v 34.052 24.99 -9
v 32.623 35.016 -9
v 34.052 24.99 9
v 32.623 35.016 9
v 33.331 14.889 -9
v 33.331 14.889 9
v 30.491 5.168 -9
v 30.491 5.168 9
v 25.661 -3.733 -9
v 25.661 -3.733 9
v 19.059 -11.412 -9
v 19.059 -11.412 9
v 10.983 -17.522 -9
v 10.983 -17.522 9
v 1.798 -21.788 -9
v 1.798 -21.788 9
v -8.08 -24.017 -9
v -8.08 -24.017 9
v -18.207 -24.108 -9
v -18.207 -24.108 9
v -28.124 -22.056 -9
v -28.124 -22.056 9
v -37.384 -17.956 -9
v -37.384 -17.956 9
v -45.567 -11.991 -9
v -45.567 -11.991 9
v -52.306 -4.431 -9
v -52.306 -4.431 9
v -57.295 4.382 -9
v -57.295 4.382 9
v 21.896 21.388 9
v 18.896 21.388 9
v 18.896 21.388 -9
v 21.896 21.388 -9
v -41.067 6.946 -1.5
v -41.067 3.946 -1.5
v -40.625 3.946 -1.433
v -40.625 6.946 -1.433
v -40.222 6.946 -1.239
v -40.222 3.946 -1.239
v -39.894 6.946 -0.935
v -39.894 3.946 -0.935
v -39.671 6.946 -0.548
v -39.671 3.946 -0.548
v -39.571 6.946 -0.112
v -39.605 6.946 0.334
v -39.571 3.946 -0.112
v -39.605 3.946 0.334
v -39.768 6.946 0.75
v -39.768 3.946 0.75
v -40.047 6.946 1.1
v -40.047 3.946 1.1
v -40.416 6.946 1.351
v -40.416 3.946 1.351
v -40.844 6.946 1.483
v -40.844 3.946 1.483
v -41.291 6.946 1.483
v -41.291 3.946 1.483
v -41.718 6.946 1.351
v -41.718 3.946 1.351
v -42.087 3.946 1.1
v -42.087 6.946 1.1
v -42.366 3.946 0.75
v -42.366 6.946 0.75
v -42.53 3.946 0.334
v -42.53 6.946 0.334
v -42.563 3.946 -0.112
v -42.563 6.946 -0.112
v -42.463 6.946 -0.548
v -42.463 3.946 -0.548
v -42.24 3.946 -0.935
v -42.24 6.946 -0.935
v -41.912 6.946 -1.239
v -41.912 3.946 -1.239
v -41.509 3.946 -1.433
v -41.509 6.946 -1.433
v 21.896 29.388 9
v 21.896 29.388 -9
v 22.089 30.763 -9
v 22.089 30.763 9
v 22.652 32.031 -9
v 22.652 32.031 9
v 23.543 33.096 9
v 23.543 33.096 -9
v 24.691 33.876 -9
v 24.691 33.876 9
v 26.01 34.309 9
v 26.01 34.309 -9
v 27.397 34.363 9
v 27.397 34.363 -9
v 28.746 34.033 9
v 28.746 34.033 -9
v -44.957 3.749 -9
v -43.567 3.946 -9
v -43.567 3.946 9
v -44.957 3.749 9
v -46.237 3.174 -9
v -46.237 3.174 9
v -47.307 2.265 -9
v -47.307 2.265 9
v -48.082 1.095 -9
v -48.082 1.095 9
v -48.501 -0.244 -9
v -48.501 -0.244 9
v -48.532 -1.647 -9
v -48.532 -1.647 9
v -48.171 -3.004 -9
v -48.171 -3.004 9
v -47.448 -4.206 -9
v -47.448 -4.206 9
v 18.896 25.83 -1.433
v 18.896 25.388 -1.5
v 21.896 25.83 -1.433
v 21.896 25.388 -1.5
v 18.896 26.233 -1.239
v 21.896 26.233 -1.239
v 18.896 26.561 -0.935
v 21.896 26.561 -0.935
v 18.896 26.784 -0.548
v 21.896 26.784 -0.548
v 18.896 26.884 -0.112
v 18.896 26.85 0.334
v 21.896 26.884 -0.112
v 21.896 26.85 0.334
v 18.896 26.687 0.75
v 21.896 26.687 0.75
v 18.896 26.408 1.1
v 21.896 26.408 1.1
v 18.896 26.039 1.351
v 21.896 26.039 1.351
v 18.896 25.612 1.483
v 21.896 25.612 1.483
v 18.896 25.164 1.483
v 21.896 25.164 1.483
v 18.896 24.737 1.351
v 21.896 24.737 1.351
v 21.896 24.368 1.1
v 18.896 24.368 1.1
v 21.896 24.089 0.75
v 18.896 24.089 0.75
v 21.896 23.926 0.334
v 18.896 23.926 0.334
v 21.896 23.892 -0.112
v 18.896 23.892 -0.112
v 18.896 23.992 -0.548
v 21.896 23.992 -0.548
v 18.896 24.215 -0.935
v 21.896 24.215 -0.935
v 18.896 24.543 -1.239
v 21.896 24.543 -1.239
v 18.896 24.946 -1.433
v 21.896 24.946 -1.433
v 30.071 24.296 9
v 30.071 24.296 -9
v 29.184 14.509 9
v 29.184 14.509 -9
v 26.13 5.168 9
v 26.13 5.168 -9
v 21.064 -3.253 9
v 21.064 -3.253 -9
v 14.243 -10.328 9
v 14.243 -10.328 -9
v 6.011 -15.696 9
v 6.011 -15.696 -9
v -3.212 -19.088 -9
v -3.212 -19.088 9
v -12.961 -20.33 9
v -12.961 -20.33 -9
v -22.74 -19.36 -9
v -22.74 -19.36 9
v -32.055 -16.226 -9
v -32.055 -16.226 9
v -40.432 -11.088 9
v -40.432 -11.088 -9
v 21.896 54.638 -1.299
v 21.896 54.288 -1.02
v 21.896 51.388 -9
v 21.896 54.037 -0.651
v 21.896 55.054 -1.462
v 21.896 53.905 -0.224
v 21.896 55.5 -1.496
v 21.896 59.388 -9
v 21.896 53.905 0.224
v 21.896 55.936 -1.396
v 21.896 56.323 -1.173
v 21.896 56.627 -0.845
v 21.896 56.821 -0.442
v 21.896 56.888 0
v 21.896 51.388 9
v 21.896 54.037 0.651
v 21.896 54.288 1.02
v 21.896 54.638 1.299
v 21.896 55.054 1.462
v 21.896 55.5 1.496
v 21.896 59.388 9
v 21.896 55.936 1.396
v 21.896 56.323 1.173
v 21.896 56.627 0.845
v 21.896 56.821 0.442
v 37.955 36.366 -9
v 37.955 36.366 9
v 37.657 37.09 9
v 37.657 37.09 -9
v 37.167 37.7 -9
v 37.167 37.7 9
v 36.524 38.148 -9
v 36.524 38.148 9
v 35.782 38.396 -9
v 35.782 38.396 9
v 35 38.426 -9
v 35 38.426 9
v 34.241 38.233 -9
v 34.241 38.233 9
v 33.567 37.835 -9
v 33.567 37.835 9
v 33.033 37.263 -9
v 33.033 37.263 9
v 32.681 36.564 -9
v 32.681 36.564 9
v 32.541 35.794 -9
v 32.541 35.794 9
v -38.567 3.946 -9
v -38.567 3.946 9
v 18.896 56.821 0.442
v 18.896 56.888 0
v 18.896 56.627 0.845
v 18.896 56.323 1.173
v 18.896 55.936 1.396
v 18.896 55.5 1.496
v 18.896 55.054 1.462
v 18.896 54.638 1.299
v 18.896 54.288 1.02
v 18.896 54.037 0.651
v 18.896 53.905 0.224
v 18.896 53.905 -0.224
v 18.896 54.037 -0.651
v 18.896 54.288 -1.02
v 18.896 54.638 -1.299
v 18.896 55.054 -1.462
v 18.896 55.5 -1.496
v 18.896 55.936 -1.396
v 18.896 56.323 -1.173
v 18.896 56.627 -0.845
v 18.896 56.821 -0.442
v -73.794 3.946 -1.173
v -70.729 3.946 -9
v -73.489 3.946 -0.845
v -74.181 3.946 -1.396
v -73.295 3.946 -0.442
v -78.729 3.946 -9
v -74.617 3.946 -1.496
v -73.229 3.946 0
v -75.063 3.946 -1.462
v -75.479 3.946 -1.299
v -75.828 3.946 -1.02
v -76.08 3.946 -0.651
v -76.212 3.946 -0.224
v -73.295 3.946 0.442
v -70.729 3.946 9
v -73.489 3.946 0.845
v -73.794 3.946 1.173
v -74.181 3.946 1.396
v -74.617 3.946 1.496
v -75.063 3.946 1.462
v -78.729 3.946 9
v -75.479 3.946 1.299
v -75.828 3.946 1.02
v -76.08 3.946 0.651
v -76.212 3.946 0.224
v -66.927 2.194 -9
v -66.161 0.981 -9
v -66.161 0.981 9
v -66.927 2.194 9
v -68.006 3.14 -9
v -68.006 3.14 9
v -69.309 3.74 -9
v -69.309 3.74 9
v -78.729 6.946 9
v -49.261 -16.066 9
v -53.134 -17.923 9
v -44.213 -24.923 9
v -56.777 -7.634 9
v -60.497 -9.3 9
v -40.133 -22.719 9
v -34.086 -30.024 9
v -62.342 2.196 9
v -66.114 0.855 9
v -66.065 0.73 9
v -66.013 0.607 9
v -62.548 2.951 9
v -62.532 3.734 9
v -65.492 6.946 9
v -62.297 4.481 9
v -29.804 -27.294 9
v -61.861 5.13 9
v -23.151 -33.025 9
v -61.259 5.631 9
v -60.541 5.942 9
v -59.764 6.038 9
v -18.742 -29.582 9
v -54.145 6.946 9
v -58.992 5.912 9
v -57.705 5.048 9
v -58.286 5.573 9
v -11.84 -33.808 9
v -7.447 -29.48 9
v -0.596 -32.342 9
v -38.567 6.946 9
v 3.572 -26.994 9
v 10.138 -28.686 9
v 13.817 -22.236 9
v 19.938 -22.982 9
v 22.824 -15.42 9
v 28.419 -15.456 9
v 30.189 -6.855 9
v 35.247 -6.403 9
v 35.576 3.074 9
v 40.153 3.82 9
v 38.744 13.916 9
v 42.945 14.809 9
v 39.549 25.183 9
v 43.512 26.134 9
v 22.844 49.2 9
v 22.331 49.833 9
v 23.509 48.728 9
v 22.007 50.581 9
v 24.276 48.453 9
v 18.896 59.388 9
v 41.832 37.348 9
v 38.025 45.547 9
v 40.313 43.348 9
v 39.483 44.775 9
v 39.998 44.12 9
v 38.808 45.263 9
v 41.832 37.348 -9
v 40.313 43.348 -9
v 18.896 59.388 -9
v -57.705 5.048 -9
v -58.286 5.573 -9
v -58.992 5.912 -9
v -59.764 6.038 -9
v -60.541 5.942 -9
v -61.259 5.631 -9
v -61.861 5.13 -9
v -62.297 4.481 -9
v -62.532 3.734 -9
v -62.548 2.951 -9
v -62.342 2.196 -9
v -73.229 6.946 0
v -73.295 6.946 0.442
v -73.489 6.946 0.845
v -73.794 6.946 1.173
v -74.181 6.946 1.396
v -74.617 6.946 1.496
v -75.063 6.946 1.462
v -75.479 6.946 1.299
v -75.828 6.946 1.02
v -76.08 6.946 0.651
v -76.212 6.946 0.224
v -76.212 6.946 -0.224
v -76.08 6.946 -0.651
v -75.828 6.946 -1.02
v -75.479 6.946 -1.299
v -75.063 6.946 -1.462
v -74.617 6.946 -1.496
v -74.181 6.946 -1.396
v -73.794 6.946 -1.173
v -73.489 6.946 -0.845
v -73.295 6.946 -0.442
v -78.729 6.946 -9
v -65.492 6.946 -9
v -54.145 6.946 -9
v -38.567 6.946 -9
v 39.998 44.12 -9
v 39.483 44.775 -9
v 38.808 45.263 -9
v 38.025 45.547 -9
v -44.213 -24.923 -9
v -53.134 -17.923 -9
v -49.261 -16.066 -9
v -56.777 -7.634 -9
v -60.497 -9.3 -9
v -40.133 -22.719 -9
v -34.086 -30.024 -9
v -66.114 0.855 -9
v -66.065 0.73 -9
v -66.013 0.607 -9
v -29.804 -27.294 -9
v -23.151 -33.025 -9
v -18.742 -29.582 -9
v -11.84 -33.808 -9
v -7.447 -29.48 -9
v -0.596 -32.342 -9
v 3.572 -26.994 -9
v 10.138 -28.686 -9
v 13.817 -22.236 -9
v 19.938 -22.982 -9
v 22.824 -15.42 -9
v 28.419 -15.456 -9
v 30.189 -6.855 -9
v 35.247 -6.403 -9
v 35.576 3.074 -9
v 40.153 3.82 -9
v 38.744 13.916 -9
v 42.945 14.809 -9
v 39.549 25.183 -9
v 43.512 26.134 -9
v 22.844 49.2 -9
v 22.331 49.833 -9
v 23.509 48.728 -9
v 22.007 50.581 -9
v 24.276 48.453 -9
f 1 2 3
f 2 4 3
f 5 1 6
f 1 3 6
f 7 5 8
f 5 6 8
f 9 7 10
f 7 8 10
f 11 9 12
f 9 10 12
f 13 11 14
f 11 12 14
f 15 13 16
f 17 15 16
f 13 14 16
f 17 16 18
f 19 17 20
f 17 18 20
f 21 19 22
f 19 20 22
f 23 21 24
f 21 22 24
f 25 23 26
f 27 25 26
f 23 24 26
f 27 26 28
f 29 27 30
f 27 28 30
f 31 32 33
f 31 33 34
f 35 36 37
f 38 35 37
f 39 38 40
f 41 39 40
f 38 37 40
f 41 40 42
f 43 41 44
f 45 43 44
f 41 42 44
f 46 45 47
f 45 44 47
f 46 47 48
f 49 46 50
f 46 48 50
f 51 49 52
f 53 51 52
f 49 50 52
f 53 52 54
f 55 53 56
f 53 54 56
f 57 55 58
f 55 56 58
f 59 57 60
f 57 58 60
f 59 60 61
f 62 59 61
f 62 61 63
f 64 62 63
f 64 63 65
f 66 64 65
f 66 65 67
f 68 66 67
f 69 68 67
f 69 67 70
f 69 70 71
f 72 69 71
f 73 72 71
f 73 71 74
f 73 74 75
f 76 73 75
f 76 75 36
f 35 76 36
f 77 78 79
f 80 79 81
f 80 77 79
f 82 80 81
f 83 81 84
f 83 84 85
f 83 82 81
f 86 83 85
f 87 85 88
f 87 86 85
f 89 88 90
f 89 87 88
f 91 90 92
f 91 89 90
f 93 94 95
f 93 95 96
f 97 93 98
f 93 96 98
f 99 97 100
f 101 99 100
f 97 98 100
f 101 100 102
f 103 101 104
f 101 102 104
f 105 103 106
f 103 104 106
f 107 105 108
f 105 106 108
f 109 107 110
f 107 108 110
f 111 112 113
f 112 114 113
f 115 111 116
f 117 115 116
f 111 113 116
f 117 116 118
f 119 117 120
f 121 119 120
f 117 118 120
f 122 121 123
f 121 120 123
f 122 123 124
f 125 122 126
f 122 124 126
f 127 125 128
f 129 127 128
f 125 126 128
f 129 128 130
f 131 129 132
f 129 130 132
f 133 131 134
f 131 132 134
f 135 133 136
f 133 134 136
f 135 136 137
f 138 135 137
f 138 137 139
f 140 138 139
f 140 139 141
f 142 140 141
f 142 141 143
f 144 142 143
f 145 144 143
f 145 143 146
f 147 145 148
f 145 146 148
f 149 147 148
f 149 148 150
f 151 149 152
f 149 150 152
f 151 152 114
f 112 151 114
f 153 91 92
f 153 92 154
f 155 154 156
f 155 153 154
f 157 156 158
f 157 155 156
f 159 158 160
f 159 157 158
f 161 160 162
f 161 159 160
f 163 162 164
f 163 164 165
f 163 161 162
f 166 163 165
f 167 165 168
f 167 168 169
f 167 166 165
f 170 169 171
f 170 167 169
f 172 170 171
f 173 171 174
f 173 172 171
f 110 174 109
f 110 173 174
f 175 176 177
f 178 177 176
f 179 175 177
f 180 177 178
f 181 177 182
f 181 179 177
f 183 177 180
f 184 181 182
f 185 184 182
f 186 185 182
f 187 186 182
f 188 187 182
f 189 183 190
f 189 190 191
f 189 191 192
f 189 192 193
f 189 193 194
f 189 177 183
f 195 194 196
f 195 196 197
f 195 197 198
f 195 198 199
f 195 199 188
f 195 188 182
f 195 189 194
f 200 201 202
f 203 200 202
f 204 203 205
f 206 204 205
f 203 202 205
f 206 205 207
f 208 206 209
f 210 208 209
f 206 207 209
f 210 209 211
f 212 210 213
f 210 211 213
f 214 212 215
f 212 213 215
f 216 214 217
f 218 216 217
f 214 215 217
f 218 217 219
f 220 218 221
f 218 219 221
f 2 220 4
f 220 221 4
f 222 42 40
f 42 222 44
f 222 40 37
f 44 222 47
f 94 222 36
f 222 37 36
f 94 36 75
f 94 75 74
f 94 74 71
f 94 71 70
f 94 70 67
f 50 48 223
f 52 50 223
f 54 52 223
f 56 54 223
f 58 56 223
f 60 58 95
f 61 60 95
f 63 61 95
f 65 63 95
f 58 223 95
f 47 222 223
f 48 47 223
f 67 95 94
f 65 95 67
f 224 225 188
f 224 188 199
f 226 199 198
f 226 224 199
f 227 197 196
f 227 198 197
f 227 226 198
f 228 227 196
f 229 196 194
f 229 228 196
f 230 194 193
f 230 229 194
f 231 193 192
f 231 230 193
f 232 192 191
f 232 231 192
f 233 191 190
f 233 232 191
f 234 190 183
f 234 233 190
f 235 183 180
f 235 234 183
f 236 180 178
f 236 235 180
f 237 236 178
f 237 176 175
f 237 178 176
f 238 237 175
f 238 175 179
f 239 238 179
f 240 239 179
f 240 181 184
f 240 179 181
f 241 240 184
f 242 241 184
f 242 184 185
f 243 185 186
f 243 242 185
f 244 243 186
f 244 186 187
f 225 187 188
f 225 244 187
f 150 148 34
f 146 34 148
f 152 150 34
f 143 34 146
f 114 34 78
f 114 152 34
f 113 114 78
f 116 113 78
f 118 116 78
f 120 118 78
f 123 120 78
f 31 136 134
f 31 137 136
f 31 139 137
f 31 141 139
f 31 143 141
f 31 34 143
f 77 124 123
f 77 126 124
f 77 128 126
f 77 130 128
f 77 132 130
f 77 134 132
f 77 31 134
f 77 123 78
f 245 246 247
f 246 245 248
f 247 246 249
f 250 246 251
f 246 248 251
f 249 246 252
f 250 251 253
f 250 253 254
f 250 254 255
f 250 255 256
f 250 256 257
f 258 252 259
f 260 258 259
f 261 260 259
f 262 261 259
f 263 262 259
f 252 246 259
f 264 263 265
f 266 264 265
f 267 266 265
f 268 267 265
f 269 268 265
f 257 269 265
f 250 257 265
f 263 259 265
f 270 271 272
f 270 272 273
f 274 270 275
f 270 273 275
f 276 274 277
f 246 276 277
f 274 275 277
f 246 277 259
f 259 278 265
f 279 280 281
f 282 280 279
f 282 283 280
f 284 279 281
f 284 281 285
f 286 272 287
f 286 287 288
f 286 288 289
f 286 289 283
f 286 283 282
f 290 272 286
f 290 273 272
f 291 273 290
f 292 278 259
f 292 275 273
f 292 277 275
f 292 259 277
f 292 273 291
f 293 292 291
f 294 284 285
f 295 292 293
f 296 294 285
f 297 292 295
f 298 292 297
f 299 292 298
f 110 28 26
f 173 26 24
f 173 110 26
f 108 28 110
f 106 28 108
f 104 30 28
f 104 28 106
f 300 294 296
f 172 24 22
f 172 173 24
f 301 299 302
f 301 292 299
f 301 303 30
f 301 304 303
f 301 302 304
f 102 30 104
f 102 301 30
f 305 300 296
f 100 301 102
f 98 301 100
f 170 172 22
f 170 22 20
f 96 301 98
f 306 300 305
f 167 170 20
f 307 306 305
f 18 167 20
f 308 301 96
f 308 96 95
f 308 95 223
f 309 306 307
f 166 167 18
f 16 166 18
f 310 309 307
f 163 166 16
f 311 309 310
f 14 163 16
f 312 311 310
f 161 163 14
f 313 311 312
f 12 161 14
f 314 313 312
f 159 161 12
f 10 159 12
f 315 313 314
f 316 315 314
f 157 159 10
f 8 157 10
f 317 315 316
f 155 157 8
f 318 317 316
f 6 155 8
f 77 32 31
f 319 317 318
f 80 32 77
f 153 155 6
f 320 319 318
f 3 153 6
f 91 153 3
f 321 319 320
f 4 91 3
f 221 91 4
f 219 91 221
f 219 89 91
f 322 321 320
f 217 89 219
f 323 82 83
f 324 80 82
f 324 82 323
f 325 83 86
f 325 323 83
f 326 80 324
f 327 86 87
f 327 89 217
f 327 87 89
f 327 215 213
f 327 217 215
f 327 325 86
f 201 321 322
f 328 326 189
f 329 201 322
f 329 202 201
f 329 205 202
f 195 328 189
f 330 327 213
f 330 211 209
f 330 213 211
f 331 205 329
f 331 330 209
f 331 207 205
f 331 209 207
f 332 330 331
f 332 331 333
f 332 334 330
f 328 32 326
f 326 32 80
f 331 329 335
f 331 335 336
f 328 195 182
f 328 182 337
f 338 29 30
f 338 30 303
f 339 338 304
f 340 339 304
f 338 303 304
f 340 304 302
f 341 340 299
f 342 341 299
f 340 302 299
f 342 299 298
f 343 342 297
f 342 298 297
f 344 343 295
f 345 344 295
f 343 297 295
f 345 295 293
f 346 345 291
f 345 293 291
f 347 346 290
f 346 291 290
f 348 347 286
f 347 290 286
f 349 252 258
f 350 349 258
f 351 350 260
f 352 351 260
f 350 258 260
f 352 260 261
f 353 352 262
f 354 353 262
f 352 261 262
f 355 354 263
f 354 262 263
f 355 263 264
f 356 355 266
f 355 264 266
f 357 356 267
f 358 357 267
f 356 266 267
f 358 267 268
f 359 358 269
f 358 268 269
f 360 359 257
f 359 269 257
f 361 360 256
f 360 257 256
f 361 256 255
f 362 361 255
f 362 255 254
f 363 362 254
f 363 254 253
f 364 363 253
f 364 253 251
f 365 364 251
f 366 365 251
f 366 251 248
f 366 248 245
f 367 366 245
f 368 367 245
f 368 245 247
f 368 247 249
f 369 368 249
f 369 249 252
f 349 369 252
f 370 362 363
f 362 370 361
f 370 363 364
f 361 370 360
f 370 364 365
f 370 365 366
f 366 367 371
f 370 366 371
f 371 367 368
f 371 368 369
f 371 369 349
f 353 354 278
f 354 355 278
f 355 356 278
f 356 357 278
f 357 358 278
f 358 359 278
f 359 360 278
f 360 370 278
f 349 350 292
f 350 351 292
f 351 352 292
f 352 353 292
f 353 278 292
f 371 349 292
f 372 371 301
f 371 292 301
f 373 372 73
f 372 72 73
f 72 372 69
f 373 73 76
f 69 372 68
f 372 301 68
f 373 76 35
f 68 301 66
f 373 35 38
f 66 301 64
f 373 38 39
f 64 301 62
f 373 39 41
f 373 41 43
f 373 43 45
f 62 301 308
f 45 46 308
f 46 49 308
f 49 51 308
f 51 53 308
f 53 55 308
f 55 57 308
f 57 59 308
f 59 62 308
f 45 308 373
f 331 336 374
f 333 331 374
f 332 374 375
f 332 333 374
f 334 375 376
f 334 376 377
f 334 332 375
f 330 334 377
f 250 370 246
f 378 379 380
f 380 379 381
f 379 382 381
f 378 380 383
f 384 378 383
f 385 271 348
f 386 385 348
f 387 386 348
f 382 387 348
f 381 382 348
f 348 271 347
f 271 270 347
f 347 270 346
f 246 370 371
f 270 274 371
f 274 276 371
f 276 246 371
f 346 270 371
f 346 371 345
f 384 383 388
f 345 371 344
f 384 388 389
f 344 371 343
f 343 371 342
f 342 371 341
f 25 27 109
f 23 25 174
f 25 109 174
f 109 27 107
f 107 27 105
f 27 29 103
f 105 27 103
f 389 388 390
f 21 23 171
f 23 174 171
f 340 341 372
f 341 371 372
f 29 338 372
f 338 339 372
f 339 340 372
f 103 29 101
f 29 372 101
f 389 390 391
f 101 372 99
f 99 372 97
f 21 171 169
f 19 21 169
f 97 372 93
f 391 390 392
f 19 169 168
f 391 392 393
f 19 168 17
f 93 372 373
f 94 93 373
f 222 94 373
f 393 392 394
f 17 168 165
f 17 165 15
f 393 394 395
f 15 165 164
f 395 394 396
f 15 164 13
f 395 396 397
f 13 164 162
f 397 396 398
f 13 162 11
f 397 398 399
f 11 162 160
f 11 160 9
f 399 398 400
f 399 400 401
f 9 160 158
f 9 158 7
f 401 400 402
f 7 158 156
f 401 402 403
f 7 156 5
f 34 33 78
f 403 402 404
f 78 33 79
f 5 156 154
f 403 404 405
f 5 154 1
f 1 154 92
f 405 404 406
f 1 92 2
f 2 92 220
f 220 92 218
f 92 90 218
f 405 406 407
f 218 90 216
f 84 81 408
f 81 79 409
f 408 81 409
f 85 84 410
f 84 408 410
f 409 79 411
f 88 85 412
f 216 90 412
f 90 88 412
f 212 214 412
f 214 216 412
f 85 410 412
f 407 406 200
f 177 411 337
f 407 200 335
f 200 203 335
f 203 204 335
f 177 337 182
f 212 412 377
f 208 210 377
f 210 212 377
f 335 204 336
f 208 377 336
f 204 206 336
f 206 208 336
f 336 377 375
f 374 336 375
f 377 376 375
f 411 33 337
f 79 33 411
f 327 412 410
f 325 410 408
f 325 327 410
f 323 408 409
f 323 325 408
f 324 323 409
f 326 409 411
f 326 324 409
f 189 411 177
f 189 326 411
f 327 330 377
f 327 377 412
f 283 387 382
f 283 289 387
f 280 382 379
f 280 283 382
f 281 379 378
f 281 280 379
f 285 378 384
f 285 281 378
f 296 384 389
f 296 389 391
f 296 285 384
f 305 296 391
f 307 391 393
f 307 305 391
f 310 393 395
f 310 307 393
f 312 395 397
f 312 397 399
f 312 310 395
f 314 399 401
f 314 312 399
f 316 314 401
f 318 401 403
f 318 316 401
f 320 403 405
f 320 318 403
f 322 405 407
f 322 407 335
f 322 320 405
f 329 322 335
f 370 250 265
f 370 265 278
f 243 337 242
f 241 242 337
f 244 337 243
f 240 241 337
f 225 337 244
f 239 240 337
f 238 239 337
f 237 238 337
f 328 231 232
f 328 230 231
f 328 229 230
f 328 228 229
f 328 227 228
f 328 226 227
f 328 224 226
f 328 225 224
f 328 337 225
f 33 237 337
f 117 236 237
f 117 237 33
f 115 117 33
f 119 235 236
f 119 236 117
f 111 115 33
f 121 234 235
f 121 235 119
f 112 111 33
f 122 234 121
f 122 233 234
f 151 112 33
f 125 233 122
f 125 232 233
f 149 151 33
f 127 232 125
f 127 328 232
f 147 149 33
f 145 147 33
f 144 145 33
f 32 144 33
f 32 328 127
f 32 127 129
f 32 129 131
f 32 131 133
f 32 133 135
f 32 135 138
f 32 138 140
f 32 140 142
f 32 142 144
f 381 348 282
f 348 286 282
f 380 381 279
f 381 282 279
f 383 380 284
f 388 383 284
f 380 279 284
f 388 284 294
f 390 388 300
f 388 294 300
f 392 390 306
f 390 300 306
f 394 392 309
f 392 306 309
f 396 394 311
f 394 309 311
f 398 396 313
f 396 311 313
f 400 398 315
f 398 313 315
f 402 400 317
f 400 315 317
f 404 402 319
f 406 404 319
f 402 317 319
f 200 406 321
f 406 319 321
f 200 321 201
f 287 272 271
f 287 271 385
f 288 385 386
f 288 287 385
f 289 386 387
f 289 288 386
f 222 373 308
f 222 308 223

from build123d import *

# Parameters (mm, degrees)
SALIENTE_EXTRUIR2_DEPTH     = 9
SALIENTE_EXTRUIR4_START     = -18
SALIENTE_EXTRUIR4_DEPTH     = 18
CORTAR_EXTRUIR3_DEPTH       = 81.972689334
CORTAR_EXTRUIR3_DEPTH_BACK  = 81.972689334
CROQUIS8_W                  = 8.024298647
CROQUIS8_H                  = 2.298422897
SALIENTE_EXTRUIR5_START     = -18
SALIENTE_EXTRUIR5_DEPTH     = 18
SALIENTE_EXTRUIR6_DEPTH     = 18
SALIENTE_EXTRUIR7_START     = -18
SALIENTE_EXTRUIR7_DEPTH     = 18
CORTAR_EXTRUIR5_DEPTH       = 118.18938142
CORTAR_EXTRUIR5_DEPTH_BACK  = 118.18938142
CROQUIS13_R                 = 1.5
CROQUIS14_R                 = 1.5
CORTAR_EXTRUIR7_DEPTH       = 4
CROQUIS15_R                 = 1.5
CORTAR_EXTRUIR8_DEPTH       = 97.711059211
CROQUIS16_R                 = 1.5
CORTAR_EXTRUIR9_DEPTH       = 97.711059211
CORTAR_EXTRUIR10_DEPTH      = 101.245514063
CORTAR_EXTRUIR10_DEPTH_BACK = 101.245514063
CROQUIS17_W                 = 15.073627069
CROQUIS17_H                 = 8.059357869


with BuildPart() as part:
    # Croquis1 → Saliente-Extruir2 (new, symmetric)
    with BuildSketch(Plane.XY):
        with BuildLine():
            ThreePointArc((-66.012618404, 0.60672559), (4.861867519, -30.780766865), (41.832299444, 37.348188804))
            ThreePointArc((41.832299444, 37.348188804), (33.631578066, 42.234206494), (28.745560376, 34.033485116))
            ThreePointArc((28.745560376, 34.033485116), (0.508301336, -18.002016476), (-53.624180056, 5.97110769))
            ThreePointArc((-53.624180056, 5.97110769), (-62.50059028, 9.483135814), (-66.012618404, 0.60672559))
        make_face()
        with BuildLine():
            ThreePointArc((37.954747128, 36.366054378), (34.613712492, 38.356654178), (32.623112692, 35.015619542))
            ThreePointArc((32.623112692, 35.015619542), (1.798246872, -21.788312888), (-57.294828456, 4.381661142))
            ThreePointArc((-57.294828456, 4.381661142), (-60.911143732, 5.812487414), (-62.341970004, 2.196172138))
            ThreePointArc((-62.341970004, 2.196172138), (3.571921983, -26.994470453), (37.954747128, 36.366054378))
        make_face(mode=Mode.SUBTRACT)
    extrude(amount=SALIENTE_EXTRUIR2_DEPTH, both=True)

    # Croquis7 → Saliente-Extruir4 (add)
    with BuildSketch(Plane(origin=(0, 0, -9), x_dir=(-1, 0, 0), z_dir=(0, 0, -1)).offset(SALIENTE_EXTRUIR4_START)):
        with BuildLine():
            Line((54.145016493, 6.946132565), (38.567143253, 6.946132565))
            Line((38.567143253, 6.946132565), (38.567143253, 3.946132565))
            Line((38.567143253, 3.946132565), (43.567143253, 3.946132565))
            ThreePointArc((43.567143253, 3.946132565), (48.081738335, 1.095186137), (47.447985926, -4.206494934))
            ThreePointArc((47.447985926, -4.206494934), (50.884688207, 0.670758181), (53.624180056, 5.97110769))
            ThreePointArc((53.624180056, 5.97110769), (53.864605301, 6.469299926), (54.145016493, 6.946132565))
        make_face()
    extrude(amount=SALIENTE_EXTRUIR4_DEPTH)

    # Croquis8 → Cortar-Extruir3 (cut, two sides: drawn at the far end of the back side and taken through both)
    with BuildSketch(Plane(origin=(0, 0, -9), x_dir=(-1, 0, 0), z_dir=(0, 0, -1)).offset(-CORTAR_EXTRUIR3_DEPTH_BACK)):
        with Locations((58.157165816, 8.095344014)):
            Rectangle(CROQUIS8_W, CROQUIS8_H)
    extrude(amount=CORTAR_EXTRUIR3_DEPTH + CORTAR_EXTRUIR3_DEPTH_BACK, mode=Mode.SUBTRACT)

    # Croquis9 → Saliente-Extruir5 (add)
    with BuildSketch(Plane(origin=(0, 0, -9), x_dir=(-1, 0, 0), z_dir=(0, 0, -1)).offset(SALIENTE_EXTRUIR5_START)):
        with BuildLine():
            Line((78.728806569, 3.946132565), (78.728806569, 6.946132565))
            Line((78.728806569, 6.946132565), (65.491781967, 6.946132565))
            ThreePointArc((65.491781967, 6.946132565), (66.526259445, 4.041984592), (66.161494713, 0.980748601))
            ThreePointArc((66.161494713, 0.980748601), (68.00603961, 3.139763461), (70.728806569, 3.946132565))
            Line((70.728806569, 3.946132565), (78.728806569, 3.946132565))
        make_face()
    extrude(amount=SALIENTE_EXTRUIR5_DEPTH)

    # Croquis10 → Saliente-Extruir6 (add)
    with BuildSketch(Plane.XY.offset(9)):
        with BuildLine():
            Line((18.89630467, 56.388029989), (18.89630467, 21.388029989))
            Line((18.89630467, 21.388029989), (21.89630467, 21.388029989))
            Line((21.89630467, 21.388029989), (21.89630467, 29.388029989))
            ThreePointArc((21.89630467, 29.388029989), (24.089730114, 33.5260415), (28.745560376, 34.033485116))
            ThreePointArc((28.745560376, 34.033485116), (30.517183559, 40.465031841), (36.949638278, 42.233355414))
            Line((36.949638278, 42.233355414), (24.158212062, 45.48024401))
            ThreePointArc((24.158212062, 45.48024401), (22.528364866, 46.546057924), (21.89630467, 48.388029989))
            Line((21.89630467, 48.388029989), (21.89630467, 56.388029989))
            Line((21.89630467, 56.388029989), (18.89630467, 56.388029989))
        make_face()
    extrude(amount=-SALIENTE_EXTRUIR6_DEPTH)

    # Croquis12 → Saliente-Extruir7 (add)
    with BuildSketch(Plane(origin=(0, 0, -9), x_dir=(-1, 0, 0), z_dir=(0, 0, -1)).offset(SALIENTE_EXTRUIR7_START)):
        with BuildLine():
            Line((-41.832299444, 37.348188804), (-40.312576156, 43.348188804))
            ThreePointArc((-40.312576156, 43.348188804), (-39.483140086, 44.774662002), (-38.02482177, 45.546735616))
            Line((-38.02482177, 45.546735616), (-24.275894818, 48.452882358))
            ThreePointArc((-24.275894818, 48.452882358), (-22.565936721, 49.49874832), (-21.89630467, 51.388029989))
            Line((-21.89630467, 51.388029989), (-21.89630467, 59.388029989))
            Line((-21.89630467, 59.388029989), (-18.89630467, 59.388029989))
            Line((-18.89630467, 59.388029989), (-18.89630467, 21.388029989))
            Line((-18.89630467, 21.388029989), (-21.89630467, 21.388029989))
            Line((-21.89630467, 21.388029989), (-21.89630467, 29.388029989))
            ThreePointArc((-21.89630467, 29.388029989), (-24.089730114, 33.5260415), (-28.745560376, 34.033485116))
            Line((-28.745560376, 34.033485116), (-32.623112692, 35.015619542))
            ThreePointArc((-32.623112692, 35.015619542), (-34.613712492, 38.356654178), (-37.954747128, 36.366054378))
            Line((-37.954747128, 36.366054378), (-41.832299444, 37.348188804))
        make_face()
    extrude(amount=SALIENTE_EXTRUIR7_DEPTH)

    # Croquis13 → Cortar-Extruir5 (cut, two sides: drawn at the far end of the back side and taken through both)
    with BuildSketch(Plane(origin=(21.89630467, 0, 0), x_dir=(0, 0, -1), z_dir=(1, 0, 0)).offset(-CORTAR_EXTRUIR5_DEPTH_BACK)):
        with Locations(Location((0, 55.388029989, 0), (0, 0, 90))):
            Circle(CROQUIS13_R)
    extrude(amount=CORTAR_EXTRUIR5_DEPTH + CORTAR_EXTRUIR5_DEPTH_BACK, mode=Mode.SUBTRACT)

    # Croquis14 → Cortar-Extruir7 (cut, symmetric)
    with BuildSketch(Plane(origin=(21.89630467, 0, 0), x_dir=(0, 0, -1), z_dir=(1, 0, 0))):
        with Locations((0, 25.388029989)):
            Circle(CROQUIS14_R)
    extrude(amount=CORTAR_EXTRUIR7_DEPTH, both=True, mode=Mode.SUBTRACT)

    # Croquis15 → Cortar-Extruir8 (cut, through all)
    with BuildSketch(Plane.XZ.offset(-3.946132565)):
        with Locations((-74.728806569, 0)):
            Circle(CROQUIS15_R)
    extrude(amount=-CORTAR_EXTRUIR8_DEPTH, mode=Mode.SUBTRACT)

    # Croquis16 → Cortar-Extruir9 (cut, through all)
    with BuildSketch(Plane.XZ.offset(-3.946132565)):
        with Locations(Location((-41.067143253, 0, 0), (0, 0, 270))):
            Circle(CROQUIS16_R)
    extrude(amount=-CORTAR_EXTRUIR9_DEPTH, mode=Mode.SUBTRACT)

    # Croquis17 → Cortar-Extruir10 (cut, two sides: drawn at the far end of the back side and taken through both)
    with BuildSketch(Plane.XY.offset(9).offset(-CORTAR_EXTRUIR10_DEPTH_BACK)):
        with Locations((-57.954968433, 10.9758115)):
            Rectangle(CROQUIS17_W, CROQUIS17_H)
    extrude(amount=CORTAR_EXTRUIR10_DEPTH + CORTAR_EXTRUIR10_DEPTH_BACK, mode=Mode.SUBTRACT)


solid = part.part
